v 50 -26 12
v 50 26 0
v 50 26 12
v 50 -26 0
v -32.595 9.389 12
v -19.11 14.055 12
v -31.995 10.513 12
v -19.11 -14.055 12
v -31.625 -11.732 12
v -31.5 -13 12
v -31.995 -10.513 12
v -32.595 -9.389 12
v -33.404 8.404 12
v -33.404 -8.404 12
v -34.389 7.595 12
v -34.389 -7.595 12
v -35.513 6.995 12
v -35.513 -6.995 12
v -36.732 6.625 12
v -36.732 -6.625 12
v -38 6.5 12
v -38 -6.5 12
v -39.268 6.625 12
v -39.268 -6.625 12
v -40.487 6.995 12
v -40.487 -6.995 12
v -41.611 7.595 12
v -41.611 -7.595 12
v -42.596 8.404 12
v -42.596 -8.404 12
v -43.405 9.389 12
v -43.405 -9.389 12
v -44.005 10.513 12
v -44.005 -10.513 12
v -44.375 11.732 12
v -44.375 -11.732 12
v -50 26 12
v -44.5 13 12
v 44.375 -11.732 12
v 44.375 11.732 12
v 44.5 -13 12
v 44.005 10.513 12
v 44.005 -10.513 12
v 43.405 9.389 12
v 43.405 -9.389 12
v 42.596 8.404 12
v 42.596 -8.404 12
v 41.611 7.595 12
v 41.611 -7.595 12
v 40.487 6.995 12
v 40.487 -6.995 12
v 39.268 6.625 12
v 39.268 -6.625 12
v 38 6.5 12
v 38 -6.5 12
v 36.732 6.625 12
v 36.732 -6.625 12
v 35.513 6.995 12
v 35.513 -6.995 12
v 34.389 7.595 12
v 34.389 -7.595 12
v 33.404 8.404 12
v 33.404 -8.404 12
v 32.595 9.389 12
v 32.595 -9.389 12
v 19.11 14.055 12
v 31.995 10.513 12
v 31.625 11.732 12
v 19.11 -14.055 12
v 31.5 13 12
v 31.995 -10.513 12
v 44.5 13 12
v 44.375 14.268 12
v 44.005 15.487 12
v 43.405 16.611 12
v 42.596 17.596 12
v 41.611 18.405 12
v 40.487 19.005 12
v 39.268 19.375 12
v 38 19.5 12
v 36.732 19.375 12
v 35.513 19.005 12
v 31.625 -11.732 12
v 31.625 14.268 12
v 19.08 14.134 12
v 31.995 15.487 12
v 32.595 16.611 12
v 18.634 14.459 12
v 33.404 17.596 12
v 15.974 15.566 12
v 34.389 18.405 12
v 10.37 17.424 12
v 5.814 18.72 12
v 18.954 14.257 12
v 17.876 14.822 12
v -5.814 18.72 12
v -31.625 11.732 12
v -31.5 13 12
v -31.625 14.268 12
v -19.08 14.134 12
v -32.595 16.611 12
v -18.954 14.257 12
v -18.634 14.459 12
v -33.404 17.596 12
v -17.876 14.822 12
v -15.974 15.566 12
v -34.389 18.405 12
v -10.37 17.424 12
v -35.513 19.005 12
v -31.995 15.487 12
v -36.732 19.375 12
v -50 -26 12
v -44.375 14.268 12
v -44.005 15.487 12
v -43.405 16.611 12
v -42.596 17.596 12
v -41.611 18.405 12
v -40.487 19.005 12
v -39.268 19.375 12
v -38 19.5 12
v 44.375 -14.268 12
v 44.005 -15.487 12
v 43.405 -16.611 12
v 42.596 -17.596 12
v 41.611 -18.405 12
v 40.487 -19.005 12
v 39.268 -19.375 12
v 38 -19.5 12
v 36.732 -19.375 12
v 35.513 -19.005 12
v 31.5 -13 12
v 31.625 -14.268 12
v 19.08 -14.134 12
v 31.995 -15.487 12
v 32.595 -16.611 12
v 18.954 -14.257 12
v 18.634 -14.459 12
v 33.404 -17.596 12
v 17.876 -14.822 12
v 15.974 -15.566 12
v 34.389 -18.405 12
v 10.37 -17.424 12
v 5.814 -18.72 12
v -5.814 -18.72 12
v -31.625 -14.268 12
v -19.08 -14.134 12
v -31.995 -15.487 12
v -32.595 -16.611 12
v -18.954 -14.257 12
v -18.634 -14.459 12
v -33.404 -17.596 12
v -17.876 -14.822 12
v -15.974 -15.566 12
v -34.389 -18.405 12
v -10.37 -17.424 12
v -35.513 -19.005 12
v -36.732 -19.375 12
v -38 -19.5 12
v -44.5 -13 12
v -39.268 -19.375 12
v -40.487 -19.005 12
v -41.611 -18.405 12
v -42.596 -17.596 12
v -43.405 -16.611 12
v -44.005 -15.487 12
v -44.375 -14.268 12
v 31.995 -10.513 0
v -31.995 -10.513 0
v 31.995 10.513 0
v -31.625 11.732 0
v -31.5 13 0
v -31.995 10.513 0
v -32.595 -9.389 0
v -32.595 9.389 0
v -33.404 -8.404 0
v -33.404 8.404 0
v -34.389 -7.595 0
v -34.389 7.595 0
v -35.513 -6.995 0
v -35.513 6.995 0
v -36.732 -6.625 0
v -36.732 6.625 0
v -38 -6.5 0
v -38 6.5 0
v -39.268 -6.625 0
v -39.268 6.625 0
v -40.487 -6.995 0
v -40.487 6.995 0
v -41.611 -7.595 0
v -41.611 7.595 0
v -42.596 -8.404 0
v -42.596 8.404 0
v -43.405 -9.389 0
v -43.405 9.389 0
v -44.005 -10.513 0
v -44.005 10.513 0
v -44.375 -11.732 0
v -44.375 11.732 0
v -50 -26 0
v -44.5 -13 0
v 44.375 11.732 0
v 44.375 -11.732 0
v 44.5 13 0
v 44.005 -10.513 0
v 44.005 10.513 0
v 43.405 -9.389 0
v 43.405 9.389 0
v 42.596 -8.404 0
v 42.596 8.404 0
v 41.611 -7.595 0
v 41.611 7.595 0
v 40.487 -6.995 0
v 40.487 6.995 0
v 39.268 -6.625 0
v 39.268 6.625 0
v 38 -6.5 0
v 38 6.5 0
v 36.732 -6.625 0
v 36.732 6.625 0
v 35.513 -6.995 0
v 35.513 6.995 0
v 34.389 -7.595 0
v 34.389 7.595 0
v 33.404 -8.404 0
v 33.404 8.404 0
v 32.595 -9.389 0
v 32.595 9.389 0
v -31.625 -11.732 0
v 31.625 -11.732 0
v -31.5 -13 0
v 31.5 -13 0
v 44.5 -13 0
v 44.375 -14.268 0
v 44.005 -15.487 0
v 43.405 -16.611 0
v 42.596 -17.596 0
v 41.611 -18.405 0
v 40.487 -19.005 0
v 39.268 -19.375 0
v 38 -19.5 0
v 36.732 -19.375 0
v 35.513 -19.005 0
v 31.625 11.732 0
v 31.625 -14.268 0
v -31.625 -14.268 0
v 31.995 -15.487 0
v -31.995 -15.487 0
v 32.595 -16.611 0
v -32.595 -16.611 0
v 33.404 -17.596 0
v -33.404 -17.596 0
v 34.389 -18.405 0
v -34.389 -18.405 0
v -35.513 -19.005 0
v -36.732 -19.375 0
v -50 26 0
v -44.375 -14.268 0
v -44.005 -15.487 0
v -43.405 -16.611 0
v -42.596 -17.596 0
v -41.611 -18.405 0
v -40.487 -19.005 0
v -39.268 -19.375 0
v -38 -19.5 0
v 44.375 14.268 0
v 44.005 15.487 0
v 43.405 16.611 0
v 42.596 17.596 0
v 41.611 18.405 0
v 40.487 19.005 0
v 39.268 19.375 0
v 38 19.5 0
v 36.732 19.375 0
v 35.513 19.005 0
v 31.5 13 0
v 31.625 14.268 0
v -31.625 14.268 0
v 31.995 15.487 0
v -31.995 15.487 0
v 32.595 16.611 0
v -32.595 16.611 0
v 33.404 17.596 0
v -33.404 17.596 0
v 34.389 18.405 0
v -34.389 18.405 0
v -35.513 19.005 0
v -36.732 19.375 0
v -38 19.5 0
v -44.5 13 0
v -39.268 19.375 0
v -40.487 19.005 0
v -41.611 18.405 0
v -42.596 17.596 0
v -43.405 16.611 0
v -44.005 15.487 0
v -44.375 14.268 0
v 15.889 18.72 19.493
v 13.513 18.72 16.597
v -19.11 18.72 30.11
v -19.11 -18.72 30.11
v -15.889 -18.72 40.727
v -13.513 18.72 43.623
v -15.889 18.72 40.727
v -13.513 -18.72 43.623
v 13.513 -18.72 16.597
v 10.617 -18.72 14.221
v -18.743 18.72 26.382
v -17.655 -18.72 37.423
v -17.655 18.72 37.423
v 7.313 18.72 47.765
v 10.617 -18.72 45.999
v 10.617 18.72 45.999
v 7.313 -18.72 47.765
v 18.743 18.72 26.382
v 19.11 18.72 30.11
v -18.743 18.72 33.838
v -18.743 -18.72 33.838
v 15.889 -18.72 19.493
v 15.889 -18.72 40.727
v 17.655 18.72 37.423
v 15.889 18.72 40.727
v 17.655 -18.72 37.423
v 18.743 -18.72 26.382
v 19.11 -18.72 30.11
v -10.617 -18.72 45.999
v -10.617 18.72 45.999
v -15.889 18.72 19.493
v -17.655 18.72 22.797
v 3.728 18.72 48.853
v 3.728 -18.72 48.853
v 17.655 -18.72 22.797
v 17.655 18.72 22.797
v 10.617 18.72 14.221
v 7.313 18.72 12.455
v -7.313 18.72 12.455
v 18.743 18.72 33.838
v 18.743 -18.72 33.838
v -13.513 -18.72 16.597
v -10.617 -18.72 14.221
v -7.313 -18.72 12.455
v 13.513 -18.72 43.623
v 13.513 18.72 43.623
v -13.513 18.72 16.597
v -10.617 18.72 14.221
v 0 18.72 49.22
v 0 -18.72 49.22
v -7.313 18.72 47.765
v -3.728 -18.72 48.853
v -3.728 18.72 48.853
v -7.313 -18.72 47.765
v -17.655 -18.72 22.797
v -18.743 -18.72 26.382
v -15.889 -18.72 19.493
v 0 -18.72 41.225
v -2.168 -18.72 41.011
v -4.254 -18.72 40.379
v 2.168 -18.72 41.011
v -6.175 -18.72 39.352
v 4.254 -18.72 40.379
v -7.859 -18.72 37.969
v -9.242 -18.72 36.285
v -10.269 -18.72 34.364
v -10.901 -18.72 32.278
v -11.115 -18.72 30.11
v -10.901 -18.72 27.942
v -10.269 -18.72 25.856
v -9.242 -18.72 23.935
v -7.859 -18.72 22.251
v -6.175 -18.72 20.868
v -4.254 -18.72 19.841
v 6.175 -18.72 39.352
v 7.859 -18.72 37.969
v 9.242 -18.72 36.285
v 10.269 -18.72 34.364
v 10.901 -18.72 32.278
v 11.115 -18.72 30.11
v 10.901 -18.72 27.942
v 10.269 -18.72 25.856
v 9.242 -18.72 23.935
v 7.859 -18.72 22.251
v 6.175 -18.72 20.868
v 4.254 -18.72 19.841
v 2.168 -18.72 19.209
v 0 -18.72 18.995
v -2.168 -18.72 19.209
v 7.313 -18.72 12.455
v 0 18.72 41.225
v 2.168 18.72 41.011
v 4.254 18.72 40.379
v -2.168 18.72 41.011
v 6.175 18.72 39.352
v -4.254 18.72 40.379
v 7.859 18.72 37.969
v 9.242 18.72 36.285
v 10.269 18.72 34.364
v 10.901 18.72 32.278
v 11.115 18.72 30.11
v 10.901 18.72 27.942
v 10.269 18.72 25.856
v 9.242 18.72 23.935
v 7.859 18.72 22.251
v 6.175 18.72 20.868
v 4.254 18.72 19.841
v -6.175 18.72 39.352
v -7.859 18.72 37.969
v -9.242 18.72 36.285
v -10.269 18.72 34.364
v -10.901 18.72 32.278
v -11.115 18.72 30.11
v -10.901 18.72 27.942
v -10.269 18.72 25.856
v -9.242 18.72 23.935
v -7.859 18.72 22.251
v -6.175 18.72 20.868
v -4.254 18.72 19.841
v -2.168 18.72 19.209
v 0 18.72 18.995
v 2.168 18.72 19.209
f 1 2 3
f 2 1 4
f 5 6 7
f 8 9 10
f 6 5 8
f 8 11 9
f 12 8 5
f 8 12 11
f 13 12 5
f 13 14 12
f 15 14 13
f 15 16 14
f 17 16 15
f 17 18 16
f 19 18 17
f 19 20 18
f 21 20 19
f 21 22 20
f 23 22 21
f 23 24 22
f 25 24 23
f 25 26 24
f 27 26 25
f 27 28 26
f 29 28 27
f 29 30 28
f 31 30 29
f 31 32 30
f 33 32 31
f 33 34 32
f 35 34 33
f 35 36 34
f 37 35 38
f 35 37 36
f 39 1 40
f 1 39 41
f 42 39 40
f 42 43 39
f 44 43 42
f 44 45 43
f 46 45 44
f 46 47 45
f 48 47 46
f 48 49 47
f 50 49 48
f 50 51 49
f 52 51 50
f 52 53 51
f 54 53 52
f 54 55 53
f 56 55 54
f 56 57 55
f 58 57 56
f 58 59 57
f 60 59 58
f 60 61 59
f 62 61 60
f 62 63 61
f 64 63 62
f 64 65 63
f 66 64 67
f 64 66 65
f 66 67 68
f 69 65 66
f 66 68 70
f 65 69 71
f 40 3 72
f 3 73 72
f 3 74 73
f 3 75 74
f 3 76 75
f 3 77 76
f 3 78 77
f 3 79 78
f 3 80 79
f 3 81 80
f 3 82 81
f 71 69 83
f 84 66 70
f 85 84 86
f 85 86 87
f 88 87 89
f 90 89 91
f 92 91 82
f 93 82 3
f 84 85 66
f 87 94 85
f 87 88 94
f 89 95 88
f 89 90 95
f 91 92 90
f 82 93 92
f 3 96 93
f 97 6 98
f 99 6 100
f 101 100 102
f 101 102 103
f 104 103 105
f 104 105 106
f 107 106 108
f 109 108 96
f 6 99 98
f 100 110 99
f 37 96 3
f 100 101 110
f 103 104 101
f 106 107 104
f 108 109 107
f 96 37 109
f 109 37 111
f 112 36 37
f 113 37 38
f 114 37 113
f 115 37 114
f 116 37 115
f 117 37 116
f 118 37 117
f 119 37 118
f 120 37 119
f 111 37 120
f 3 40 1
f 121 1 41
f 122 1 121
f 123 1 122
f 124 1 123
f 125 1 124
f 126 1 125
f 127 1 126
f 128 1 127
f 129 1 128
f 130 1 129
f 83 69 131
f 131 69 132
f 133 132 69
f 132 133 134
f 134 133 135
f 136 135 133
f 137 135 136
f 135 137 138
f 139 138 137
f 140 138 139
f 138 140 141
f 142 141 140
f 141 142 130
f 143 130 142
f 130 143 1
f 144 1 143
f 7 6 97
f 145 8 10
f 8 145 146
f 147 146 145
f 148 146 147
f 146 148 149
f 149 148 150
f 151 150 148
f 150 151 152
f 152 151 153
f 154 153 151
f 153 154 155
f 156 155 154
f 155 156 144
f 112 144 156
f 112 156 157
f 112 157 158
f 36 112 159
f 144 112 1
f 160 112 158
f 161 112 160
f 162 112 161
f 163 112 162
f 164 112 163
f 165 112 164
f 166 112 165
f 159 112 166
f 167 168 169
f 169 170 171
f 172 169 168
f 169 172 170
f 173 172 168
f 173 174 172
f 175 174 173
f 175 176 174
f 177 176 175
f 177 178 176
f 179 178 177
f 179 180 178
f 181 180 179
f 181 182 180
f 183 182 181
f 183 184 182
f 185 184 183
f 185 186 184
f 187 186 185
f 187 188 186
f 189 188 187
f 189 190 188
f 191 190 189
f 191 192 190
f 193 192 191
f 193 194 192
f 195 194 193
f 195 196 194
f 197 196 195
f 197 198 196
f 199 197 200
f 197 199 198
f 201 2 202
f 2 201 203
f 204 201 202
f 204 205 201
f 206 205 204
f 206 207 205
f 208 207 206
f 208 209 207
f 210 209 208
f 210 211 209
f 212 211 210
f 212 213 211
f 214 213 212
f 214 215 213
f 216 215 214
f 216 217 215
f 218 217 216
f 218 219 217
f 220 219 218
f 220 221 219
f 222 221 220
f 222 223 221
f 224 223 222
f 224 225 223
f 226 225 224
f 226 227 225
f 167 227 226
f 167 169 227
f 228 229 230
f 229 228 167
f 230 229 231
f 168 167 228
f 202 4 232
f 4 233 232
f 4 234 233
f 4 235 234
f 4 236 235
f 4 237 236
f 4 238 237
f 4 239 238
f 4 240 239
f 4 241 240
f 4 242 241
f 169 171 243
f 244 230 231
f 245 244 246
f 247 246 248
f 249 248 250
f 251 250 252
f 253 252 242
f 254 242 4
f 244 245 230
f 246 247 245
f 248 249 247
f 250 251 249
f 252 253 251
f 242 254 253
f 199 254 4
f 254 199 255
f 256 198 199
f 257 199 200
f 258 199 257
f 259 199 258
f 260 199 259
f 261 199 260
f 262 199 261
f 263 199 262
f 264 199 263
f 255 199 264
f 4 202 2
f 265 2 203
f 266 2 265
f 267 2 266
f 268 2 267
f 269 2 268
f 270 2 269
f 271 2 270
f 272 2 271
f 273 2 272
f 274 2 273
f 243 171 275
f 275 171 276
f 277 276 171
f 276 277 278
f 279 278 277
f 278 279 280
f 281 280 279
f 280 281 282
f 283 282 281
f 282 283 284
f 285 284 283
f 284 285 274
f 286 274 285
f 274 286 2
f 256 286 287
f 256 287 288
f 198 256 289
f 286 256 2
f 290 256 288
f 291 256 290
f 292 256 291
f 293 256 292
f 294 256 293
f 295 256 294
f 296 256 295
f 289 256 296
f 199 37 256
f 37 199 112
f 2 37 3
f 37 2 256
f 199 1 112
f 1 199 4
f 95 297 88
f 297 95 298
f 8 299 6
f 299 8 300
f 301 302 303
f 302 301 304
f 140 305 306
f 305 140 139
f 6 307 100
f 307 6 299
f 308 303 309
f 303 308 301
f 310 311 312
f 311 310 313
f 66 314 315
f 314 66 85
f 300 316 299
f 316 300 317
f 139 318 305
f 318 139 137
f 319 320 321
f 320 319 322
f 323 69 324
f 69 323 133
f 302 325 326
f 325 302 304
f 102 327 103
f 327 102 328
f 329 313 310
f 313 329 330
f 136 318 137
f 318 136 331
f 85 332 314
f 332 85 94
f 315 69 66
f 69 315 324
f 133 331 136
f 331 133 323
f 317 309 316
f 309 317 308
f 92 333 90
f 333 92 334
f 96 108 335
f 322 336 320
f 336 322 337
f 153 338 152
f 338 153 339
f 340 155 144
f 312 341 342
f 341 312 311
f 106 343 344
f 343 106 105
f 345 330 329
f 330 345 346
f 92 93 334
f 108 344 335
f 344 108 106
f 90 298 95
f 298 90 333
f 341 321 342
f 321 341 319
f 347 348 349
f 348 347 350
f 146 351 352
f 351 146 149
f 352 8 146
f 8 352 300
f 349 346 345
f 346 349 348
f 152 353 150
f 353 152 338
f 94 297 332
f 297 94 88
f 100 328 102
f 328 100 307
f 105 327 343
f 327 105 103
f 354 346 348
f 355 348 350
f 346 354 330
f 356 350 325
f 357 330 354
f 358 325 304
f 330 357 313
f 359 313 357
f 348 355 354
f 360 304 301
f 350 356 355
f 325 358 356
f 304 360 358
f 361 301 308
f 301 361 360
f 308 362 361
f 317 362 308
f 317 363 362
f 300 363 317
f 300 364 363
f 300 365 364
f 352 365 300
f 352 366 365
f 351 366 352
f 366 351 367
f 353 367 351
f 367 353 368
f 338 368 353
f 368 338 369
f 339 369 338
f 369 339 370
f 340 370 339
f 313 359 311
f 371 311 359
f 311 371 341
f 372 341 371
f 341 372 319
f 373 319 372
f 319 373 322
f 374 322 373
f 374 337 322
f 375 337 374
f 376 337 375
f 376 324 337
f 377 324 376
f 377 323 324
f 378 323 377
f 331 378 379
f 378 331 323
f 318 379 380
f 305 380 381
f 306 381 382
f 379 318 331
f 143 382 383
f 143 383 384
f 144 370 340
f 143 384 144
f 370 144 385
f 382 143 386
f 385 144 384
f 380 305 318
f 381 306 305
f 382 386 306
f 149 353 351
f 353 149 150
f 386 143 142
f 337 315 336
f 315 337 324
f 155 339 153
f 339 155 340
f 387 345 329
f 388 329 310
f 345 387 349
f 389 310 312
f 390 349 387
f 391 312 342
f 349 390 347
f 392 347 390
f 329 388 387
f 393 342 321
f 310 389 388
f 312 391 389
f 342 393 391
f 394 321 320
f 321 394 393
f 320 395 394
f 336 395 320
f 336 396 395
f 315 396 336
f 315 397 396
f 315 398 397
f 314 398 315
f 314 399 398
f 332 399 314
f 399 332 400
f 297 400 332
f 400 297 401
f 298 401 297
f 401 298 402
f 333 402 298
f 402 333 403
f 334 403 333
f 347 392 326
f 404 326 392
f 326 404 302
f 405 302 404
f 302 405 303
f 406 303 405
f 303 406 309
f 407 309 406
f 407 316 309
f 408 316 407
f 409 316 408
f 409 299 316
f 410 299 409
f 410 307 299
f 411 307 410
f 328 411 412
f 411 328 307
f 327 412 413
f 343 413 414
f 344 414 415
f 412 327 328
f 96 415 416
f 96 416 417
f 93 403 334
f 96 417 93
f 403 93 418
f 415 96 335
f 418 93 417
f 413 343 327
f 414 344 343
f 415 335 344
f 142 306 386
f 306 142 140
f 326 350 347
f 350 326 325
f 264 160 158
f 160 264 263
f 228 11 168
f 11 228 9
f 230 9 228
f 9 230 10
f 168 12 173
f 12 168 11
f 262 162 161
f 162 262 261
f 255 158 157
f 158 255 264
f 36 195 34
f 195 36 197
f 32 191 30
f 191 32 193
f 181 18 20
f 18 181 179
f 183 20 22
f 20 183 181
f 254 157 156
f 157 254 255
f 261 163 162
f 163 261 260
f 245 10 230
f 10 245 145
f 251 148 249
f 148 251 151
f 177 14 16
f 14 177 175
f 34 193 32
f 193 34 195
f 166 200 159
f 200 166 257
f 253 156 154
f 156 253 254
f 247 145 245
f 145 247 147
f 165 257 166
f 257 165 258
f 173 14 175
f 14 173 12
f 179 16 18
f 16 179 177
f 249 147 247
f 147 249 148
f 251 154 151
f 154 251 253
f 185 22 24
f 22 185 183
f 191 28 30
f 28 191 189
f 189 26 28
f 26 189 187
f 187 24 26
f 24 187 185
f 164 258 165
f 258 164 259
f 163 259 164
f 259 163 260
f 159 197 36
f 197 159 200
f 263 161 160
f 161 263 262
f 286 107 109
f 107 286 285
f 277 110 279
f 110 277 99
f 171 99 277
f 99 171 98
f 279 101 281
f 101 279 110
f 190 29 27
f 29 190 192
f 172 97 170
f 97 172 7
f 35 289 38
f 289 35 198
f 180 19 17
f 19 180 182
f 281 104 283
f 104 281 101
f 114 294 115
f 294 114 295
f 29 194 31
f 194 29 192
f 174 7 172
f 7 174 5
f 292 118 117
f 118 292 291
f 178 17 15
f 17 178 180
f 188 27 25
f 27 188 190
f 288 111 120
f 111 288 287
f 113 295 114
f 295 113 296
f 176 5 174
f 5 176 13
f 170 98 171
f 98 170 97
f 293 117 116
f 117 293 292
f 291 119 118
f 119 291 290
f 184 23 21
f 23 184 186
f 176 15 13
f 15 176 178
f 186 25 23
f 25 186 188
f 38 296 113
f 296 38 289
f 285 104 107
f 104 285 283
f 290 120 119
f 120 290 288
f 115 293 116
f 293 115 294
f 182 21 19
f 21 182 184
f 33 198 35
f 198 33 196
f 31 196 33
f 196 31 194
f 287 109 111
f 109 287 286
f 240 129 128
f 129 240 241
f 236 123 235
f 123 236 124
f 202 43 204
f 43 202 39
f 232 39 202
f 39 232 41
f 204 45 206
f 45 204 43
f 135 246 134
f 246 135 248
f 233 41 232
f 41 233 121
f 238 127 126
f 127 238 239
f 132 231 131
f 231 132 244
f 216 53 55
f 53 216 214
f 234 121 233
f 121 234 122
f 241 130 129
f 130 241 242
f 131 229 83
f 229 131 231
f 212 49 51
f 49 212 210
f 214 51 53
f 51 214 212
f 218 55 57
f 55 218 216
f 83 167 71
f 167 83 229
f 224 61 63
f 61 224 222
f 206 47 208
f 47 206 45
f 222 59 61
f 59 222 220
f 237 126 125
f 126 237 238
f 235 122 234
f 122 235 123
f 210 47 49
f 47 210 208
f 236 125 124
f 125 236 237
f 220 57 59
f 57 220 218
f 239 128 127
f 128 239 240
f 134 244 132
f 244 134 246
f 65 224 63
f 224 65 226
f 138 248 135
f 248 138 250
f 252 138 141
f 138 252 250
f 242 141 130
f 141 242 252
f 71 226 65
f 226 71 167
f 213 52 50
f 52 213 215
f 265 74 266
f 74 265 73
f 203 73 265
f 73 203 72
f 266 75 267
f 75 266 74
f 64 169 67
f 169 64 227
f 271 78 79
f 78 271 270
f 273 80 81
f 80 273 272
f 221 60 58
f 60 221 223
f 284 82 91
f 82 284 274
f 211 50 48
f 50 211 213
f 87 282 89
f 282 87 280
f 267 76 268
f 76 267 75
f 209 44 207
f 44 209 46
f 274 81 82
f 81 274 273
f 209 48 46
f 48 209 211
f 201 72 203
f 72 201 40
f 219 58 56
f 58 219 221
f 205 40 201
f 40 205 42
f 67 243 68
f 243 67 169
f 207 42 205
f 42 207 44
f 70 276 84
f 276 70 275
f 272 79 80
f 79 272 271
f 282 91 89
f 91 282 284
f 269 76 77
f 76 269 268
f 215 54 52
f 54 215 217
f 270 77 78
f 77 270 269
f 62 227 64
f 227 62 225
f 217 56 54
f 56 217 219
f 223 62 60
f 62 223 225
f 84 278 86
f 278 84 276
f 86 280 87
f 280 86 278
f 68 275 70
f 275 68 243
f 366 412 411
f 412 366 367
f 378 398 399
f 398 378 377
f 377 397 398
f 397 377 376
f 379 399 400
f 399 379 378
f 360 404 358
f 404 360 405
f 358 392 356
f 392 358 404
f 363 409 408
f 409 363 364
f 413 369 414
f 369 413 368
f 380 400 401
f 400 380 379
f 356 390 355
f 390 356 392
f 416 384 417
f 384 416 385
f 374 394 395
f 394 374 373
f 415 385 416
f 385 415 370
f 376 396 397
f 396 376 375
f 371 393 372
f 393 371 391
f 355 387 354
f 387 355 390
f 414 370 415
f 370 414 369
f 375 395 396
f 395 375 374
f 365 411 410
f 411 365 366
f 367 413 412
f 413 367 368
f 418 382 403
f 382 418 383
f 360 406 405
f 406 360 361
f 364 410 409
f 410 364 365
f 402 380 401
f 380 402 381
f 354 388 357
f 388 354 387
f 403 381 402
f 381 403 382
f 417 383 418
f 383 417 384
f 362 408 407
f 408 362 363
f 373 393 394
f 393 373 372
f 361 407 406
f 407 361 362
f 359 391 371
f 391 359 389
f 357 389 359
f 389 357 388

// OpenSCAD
$fn = 32;

// ----------------------------------------------------------------------
// Bearing block: 100 x 52 mm base, 22.23 mm bore at 30.11 mm
// ----------------------------------------------------------------------

// --- parameters (mm) ---
base_w = 100;             // base width
base_d = 52;              // base depth
base_t = 12;              // base thickness
bore_d = 22.23;           // shaft / bearing bore
house_r = 19.11;          // housing outer radius
house_len = 37.44;        // housing length along the shaft
foot_w = 38.22;           // foot width under the housing
foot_len = 27.44;         // foot length along the shaft
axis_z = 30.11;           // bore axis height above the base
holes_d = 13;             // mounting holes
hole_x = 38;              // mounting hole spacing

difference() {
  union() {
    /* base plate with its underside on z = 0 */
    translate([0, 0, base_t / 2]) cube([base_w, base_d, base_t], center = true);
    /* hull foot: a straight web blending into the round housing */
    hull() {
      translate([0, 0, base_t - 0.5]) cube([foot_w, foot_len, 1.6], center = true);
      translate([0, 0, axis_z]) rotate([-90, 0, 0]) cylinder(h = house_len, d = 2 * house_r, center = true);
    }
  }
  /* bore through the housing, 2.5 mm clear on both sides */
  translate([0, 0, axis_z]) rotate([-90, 0, 0]) cylinder(h = house_len + 5, d = bore_d, center = true);
  /* mounting holes through the base plate */
  for (hx = [-38, 38]) {
    for (hy = [-13, 13]) {
      translate([hx, hy, -2.5]) cylinder(h = base_t + 5, d = holes_d);
    }
  }
}
